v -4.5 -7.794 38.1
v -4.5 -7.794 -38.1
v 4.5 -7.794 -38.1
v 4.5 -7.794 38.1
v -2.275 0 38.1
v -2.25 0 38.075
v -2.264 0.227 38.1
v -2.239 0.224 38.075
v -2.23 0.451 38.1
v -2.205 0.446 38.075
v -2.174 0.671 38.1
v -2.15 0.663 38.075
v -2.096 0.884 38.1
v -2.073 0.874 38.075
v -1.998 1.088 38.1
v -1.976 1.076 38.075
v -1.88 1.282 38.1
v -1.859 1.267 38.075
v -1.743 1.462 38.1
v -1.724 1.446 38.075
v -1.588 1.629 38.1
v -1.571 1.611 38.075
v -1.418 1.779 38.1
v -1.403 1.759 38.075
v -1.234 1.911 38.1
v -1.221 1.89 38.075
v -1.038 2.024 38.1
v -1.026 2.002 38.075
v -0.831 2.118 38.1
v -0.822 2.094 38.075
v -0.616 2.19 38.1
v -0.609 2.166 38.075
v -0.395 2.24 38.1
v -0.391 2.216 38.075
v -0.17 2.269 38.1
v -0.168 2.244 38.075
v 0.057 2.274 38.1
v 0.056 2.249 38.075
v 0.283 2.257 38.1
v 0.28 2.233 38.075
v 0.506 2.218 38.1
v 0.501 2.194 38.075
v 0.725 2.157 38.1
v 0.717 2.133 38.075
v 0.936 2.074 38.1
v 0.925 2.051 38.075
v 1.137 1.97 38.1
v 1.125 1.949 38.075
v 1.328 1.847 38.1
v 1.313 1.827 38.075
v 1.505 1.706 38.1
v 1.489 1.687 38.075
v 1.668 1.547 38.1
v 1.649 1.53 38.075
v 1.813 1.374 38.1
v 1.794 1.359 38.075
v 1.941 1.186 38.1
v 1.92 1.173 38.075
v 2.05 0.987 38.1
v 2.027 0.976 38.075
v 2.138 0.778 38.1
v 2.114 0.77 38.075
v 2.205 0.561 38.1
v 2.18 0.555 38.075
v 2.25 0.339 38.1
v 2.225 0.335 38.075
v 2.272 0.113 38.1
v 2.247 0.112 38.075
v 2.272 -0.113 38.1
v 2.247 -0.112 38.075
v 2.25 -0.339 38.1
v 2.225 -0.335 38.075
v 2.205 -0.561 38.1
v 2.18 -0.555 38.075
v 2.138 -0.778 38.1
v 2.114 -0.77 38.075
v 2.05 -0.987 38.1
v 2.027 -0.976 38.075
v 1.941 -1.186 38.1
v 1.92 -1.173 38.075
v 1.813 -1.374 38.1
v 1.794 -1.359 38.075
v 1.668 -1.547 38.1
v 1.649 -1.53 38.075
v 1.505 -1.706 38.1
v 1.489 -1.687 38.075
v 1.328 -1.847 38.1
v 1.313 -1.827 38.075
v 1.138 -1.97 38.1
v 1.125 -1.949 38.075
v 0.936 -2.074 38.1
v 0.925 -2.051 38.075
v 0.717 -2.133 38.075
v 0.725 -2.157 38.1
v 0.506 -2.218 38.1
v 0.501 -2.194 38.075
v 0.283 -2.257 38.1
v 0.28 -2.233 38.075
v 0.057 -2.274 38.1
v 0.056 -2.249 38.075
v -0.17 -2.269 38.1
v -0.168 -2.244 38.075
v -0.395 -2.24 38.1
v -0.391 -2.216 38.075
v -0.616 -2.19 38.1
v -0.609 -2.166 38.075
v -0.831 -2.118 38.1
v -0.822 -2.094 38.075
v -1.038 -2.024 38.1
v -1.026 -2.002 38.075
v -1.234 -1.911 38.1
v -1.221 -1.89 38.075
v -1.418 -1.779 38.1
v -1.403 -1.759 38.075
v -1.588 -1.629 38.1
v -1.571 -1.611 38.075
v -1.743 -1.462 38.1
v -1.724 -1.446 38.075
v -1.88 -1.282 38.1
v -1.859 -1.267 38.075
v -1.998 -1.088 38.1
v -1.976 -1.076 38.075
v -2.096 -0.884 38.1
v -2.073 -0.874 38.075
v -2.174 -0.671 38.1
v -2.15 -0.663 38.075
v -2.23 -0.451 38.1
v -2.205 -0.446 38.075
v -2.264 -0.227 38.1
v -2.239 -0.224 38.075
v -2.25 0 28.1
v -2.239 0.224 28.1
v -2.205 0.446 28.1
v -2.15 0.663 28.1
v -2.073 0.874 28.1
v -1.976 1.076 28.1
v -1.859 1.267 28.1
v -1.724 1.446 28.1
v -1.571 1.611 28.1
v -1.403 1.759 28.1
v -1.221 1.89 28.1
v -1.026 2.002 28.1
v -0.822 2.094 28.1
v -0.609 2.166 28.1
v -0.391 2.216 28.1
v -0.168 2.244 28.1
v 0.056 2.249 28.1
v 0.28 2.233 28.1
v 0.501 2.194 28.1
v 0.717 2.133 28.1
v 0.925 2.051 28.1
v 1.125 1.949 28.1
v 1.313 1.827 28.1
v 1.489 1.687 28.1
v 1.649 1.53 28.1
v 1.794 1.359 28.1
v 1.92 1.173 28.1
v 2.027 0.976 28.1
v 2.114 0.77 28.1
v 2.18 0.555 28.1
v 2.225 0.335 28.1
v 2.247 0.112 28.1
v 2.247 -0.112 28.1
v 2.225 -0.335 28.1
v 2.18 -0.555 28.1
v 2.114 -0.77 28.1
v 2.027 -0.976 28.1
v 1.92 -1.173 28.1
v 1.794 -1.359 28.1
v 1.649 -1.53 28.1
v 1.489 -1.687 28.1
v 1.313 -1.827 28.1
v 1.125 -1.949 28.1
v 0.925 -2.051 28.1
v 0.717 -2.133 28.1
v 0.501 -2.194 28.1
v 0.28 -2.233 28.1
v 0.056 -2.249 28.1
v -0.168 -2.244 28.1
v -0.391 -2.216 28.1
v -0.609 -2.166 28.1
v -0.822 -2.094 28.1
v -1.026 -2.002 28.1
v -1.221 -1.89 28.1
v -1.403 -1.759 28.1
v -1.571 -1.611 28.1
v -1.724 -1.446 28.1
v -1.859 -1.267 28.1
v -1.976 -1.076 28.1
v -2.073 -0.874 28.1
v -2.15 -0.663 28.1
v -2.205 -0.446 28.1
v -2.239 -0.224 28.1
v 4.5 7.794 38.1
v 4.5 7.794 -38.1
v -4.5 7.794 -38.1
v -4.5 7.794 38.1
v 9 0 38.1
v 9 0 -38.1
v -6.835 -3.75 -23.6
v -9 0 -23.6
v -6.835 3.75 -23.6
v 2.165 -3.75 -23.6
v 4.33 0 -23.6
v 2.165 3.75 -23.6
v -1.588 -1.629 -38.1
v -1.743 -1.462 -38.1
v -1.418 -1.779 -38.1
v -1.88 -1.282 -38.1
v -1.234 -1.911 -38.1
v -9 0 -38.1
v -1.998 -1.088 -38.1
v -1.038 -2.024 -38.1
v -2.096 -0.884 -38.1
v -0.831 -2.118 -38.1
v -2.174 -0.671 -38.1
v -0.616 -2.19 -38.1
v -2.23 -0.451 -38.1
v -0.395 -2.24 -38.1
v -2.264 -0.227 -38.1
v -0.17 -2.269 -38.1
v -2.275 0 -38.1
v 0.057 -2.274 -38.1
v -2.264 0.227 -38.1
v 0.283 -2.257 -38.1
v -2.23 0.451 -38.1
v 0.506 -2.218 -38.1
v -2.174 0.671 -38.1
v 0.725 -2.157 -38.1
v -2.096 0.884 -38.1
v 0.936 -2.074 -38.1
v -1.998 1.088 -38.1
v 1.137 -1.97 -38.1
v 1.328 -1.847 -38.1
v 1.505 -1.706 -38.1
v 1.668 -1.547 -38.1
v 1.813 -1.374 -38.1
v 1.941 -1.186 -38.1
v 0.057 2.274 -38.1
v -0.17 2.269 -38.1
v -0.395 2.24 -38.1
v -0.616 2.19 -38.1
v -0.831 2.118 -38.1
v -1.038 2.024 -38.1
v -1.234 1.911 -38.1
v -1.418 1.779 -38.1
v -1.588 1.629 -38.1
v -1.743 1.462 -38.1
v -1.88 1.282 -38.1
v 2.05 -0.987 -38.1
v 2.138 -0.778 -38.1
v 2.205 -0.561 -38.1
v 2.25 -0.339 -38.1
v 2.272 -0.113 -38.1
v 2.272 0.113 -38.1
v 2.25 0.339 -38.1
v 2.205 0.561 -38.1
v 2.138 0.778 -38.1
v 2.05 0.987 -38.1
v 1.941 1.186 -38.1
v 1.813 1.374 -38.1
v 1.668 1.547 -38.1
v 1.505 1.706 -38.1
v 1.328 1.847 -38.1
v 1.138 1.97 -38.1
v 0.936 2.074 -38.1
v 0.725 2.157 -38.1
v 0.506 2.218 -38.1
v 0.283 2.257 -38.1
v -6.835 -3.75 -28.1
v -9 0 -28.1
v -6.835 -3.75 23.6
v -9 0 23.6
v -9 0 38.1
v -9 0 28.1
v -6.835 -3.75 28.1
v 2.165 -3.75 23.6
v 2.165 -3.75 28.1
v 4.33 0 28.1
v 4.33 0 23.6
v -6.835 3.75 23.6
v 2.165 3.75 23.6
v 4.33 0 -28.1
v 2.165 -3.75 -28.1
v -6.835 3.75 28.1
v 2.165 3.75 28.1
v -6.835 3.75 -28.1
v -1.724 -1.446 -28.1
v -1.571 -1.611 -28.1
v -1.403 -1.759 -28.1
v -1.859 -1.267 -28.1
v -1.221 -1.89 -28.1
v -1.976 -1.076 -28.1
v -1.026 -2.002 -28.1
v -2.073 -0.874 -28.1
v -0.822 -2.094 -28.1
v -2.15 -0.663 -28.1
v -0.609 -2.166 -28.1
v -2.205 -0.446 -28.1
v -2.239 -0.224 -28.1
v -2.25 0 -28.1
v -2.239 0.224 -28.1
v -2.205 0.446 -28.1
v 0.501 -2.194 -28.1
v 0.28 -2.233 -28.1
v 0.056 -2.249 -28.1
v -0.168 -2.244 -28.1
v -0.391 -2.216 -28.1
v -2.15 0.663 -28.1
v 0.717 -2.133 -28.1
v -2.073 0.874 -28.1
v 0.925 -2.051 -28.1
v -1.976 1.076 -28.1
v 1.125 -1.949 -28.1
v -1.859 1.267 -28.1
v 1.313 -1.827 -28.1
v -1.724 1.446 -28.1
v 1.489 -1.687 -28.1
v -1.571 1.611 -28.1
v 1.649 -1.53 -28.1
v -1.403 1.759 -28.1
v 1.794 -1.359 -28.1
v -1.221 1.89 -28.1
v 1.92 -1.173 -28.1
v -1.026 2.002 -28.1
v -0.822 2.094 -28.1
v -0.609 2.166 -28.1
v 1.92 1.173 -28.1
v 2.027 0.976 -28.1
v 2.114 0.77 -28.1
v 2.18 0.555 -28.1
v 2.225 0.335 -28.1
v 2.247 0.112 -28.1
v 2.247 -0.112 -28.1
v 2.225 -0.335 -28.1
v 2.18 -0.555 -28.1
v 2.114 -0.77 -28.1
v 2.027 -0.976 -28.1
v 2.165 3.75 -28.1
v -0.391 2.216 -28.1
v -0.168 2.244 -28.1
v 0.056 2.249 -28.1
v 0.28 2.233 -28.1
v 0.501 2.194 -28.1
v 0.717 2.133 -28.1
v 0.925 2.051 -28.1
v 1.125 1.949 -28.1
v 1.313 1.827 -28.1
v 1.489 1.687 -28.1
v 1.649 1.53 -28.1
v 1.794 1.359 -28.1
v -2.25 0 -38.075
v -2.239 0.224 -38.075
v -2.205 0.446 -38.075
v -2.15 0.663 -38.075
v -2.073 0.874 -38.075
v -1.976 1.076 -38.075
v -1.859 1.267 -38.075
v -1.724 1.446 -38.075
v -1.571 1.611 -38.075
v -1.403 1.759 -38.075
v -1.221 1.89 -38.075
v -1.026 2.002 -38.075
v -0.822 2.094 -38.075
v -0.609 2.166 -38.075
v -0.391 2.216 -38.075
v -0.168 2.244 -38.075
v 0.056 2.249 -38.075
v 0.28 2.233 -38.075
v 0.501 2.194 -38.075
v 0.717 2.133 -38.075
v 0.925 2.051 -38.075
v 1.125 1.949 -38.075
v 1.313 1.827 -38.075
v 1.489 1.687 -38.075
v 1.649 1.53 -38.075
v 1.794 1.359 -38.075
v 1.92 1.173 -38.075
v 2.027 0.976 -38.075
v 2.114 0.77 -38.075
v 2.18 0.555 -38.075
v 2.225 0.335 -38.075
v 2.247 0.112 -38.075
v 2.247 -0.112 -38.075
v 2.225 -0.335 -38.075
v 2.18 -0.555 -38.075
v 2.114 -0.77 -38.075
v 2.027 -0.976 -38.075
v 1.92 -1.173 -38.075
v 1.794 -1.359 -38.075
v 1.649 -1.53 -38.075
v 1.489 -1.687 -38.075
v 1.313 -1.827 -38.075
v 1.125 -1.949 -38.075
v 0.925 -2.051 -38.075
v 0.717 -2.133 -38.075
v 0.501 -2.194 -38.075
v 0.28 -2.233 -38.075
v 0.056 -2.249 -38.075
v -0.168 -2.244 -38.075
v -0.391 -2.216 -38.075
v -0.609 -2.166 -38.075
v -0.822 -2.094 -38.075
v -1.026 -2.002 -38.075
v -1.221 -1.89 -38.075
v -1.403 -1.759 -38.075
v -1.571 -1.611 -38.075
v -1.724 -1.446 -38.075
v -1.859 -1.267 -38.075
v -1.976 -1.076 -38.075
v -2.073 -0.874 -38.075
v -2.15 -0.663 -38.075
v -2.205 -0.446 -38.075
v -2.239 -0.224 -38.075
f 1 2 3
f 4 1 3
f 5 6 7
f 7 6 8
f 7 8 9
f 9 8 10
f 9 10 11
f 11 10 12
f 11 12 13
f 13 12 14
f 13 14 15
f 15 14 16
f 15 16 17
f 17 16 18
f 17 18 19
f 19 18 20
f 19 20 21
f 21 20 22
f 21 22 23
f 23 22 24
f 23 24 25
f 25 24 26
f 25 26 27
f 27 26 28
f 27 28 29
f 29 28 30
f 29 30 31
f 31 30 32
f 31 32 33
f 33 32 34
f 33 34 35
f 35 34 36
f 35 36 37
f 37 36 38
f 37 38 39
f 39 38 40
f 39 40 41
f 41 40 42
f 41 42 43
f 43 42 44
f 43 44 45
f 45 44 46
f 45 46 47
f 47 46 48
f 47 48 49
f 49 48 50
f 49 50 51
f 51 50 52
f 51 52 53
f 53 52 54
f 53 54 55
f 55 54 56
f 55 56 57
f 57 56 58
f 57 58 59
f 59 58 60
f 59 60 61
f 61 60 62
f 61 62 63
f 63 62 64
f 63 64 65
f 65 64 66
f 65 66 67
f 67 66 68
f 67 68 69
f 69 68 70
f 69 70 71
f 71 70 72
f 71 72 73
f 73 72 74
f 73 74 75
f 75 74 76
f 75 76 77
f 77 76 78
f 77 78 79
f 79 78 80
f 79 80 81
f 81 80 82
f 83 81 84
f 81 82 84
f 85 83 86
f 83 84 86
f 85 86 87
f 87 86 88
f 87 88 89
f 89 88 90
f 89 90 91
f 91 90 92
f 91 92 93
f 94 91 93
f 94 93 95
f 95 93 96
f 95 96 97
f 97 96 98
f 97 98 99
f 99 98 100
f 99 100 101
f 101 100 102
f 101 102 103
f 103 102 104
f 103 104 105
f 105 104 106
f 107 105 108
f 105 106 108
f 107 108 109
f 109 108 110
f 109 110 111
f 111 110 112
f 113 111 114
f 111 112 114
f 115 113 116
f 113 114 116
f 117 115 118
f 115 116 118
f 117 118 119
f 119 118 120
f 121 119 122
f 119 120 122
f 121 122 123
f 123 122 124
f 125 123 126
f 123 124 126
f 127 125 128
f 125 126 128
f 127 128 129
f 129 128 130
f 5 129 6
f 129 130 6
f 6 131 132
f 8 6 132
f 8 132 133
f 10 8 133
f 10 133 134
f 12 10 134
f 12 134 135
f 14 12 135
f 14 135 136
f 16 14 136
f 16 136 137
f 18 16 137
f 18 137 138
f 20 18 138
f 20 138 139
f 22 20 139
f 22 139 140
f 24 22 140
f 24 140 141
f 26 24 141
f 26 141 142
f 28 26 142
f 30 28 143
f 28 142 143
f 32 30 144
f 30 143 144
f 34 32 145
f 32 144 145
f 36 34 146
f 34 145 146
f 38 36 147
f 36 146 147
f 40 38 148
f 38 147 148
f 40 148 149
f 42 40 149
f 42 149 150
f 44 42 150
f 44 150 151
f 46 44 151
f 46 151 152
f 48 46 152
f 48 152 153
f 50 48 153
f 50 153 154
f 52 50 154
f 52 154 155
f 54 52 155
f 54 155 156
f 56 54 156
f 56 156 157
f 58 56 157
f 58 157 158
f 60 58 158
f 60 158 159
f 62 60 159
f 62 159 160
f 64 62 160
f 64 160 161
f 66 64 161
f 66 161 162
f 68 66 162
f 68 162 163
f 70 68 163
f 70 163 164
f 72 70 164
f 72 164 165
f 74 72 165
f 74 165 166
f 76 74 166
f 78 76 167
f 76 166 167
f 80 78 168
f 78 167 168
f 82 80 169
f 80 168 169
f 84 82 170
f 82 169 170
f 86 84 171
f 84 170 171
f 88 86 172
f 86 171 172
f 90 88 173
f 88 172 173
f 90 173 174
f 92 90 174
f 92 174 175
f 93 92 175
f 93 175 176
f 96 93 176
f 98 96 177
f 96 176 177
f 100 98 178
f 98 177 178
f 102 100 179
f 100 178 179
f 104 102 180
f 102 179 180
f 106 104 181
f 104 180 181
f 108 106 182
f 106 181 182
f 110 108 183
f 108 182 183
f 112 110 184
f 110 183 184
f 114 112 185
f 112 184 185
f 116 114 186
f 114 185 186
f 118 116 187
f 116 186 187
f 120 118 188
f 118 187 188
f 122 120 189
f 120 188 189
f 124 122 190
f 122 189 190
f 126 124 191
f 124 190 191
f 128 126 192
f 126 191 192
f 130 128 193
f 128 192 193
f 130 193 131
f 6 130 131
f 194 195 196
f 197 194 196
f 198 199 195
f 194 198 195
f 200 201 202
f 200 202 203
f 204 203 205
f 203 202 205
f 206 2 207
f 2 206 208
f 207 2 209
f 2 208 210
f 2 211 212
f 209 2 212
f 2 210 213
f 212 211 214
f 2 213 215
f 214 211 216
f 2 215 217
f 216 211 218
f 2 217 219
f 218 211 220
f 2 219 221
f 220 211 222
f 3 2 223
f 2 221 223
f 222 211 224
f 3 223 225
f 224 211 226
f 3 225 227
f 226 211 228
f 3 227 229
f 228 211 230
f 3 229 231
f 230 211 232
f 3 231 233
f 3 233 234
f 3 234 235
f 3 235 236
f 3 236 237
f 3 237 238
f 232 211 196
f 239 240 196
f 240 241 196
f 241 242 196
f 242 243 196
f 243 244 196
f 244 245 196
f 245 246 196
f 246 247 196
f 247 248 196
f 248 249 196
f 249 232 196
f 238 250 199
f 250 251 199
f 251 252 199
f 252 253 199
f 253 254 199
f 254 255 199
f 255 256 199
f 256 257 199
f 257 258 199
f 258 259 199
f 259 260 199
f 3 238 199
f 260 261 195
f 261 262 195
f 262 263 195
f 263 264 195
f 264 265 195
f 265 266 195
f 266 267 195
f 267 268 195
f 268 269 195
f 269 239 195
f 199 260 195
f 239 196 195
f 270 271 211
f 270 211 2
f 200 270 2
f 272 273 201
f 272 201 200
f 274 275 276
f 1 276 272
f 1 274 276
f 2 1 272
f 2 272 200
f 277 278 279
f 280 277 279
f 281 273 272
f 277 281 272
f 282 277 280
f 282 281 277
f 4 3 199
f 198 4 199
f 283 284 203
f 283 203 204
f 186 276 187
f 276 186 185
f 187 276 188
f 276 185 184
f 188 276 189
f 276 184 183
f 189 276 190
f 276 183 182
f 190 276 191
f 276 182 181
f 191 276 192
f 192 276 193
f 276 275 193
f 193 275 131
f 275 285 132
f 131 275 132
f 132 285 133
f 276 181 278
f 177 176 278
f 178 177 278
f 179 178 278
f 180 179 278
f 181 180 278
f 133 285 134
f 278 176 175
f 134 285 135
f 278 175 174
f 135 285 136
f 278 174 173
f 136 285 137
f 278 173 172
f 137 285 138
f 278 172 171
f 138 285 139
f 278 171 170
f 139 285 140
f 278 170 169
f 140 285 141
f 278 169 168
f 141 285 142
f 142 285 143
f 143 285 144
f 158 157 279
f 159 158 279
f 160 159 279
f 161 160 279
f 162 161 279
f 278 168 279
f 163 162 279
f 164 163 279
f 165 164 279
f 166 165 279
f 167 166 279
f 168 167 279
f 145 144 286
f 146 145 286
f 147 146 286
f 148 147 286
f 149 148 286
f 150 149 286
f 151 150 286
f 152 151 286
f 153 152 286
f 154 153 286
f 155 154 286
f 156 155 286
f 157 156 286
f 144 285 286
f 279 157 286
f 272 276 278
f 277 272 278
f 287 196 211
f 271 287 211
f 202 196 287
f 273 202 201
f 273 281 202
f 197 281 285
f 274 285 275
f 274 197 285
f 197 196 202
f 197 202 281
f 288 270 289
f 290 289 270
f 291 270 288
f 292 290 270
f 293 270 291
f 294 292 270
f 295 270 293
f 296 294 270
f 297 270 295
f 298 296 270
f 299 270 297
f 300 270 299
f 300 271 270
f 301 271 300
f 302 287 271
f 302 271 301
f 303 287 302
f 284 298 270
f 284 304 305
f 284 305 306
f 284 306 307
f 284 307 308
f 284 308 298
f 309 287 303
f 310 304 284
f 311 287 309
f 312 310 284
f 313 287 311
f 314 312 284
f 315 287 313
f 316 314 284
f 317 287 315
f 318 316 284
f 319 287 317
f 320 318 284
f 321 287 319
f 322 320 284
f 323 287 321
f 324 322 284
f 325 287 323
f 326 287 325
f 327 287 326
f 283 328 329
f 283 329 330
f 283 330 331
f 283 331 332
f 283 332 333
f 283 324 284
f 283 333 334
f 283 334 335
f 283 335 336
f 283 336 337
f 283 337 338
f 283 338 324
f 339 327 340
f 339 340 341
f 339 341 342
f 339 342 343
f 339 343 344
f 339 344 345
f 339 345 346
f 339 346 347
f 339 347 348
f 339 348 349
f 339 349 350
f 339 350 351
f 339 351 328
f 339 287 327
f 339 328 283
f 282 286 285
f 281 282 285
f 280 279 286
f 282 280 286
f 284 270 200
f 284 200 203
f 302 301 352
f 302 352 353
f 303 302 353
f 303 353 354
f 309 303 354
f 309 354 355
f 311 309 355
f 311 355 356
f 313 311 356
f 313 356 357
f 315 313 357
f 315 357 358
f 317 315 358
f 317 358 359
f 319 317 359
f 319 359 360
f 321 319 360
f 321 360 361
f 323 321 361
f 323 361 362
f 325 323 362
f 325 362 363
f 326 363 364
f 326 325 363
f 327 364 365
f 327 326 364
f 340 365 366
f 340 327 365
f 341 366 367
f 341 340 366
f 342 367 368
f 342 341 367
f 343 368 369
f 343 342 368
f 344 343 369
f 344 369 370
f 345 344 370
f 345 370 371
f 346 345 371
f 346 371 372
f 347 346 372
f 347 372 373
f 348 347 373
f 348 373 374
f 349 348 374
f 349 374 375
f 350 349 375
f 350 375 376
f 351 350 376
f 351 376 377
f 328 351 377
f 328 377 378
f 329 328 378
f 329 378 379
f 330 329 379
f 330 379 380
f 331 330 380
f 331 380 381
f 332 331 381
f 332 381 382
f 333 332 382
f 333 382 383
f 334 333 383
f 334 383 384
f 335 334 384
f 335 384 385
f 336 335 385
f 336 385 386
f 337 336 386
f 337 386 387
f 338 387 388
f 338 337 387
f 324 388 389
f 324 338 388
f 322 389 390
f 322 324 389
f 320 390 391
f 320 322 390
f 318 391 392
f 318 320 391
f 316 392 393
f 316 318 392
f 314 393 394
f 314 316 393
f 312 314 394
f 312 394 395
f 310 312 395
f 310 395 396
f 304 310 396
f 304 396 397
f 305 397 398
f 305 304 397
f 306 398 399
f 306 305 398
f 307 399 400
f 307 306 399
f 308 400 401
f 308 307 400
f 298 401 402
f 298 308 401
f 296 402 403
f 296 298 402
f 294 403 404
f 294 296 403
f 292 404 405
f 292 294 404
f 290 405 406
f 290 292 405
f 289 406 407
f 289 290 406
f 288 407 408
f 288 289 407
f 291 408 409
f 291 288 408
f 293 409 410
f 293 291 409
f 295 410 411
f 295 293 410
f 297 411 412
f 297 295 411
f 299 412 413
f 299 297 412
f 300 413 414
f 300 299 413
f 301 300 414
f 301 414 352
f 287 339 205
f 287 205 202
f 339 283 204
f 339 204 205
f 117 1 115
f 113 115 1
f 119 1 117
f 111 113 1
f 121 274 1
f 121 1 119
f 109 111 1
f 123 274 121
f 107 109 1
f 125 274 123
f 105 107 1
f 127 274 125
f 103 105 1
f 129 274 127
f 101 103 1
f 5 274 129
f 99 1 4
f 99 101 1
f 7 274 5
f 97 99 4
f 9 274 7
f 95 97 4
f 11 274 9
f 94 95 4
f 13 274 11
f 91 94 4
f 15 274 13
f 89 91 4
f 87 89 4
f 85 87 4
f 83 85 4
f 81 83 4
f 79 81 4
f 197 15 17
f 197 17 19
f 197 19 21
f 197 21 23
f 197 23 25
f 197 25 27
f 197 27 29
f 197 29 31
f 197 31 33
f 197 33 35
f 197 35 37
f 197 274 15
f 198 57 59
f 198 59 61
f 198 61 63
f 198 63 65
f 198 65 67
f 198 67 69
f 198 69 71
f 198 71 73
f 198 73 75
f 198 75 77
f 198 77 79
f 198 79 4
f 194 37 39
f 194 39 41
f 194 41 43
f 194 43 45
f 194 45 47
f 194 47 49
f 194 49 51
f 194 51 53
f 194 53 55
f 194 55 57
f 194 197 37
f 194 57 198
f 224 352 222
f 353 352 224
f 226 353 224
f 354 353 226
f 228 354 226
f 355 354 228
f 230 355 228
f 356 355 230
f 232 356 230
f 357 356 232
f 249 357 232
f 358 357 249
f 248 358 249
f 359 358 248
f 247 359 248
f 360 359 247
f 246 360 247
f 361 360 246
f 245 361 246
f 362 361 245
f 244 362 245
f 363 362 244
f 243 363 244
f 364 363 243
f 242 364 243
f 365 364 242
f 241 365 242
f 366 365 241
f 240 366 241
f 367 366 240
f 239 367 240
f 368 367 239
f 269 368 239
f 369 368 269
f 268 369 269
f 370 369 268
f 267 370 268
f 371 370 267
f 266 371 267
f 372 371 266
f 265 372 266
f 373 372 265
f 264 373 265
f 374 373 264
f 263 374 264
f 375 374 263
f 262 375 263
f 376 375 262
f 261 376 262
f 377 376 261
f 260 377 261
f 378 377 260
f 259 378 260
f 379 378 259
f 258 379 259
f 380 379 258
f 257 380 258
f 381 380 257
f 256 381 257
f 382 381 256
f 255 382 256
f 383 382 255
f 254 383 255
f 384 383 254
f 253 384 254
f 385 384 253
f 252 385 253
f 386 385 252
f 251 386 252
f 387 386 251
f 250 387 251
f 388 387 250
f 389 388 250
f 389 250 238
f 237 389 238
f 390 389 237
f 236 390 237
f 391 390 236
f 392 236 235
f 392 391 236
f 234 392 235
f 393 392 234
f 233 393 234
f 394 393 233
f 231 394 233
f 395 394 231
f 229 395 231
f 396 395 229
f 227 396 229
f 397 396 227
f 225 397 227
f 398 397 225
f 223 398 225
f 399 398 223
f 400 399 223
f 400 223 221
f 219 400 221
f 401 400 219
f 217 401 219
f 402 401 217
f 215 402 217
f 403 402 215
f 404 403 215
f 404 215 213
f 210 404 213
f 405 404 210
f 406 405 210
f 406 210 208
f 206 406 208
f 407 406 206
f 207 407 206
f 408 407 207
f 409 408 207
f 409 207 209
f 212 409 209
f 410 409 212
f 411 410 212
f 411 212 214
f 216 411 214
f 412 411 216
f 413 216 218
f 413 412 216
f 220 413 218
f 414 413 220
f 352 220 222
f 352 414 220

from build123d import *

# Parameters (mm, degrees)
RESSALTO_EXTRUS_O1_DEPTH          = 38.1
CORTE_EXTRUS_O1_START             = -10
CORTE_EXTRUS_O1_DEPTH             = 4.5
FURO_COM_FOLGA_DE_M41_D           = 4.5
FURO_COM_FOLGA_DE_M41_DEPTH       = 10
FURO_COM_FOLGA_DE_M41_CSINK_D     = 4.55
FURO_COM_FOLGA_DE_M41_CSINK_ANGLE = 90


with BuildPart() as part:
    # Esboço1 → Ressalto-extrusão1 (new body, symmetric)
    with BuildSketch(Plane.XY):
        Polygon((-4.5, -7.794228634), (4.5, -7.794228634), (9, 0), (4.5, 7.794228634), (-4.5, 7.794228634), (-9, 0), align=None)
    extrude(amount=RESSALTO_EXTRUS_O1_DEPTH, both=True)

    # Esboço4 → Corte-extrusão1 (cut)
    with BuildSketch(Plane.XY.offset(38.1).offset(CORTE_EXTRUS_O1_START)):
        Polygon((2.165063509, 3.75), (-6.834936491, 3.75), (-9, 0), (-6.834936491, -3.75), (2.165063509, -3.75), (4.330127019, 0), align=None)
    corte_extrus_o1 = extrude(amount=-CORTE_EXTRUS_O1_DEPTH, mode=Mode.SUBTRACT)

    # Furo com folga de M41
    with Locations(Plane.XY.offset(38.1)):
        with Locations((0, 0)):
            furo_com_folga_de_m41 = CounterSinkHole(FURO_COM_FOLGA_DE_M41_D / 2, FURO_COM_FOLGA_DE_M41_CSINK_D / 2, depth=FURO_COM_FOLGA_DE_M41_DEPTH, counter_sink_angle=FURO_COM_FOLGA_DE_M41_CSINK_ANGLE)

    # Espelhar1: Corte-extrusão1, Furo com folga de M41 across plane
    add(corte_extrus_o1.mirror(Plane.XY), mode=Mode.SUBTRACT)
    add(furo_com_folga_de_m41.mirror(Plane.XY), mode=Mode.SUBTRACT)


solid = part.part
